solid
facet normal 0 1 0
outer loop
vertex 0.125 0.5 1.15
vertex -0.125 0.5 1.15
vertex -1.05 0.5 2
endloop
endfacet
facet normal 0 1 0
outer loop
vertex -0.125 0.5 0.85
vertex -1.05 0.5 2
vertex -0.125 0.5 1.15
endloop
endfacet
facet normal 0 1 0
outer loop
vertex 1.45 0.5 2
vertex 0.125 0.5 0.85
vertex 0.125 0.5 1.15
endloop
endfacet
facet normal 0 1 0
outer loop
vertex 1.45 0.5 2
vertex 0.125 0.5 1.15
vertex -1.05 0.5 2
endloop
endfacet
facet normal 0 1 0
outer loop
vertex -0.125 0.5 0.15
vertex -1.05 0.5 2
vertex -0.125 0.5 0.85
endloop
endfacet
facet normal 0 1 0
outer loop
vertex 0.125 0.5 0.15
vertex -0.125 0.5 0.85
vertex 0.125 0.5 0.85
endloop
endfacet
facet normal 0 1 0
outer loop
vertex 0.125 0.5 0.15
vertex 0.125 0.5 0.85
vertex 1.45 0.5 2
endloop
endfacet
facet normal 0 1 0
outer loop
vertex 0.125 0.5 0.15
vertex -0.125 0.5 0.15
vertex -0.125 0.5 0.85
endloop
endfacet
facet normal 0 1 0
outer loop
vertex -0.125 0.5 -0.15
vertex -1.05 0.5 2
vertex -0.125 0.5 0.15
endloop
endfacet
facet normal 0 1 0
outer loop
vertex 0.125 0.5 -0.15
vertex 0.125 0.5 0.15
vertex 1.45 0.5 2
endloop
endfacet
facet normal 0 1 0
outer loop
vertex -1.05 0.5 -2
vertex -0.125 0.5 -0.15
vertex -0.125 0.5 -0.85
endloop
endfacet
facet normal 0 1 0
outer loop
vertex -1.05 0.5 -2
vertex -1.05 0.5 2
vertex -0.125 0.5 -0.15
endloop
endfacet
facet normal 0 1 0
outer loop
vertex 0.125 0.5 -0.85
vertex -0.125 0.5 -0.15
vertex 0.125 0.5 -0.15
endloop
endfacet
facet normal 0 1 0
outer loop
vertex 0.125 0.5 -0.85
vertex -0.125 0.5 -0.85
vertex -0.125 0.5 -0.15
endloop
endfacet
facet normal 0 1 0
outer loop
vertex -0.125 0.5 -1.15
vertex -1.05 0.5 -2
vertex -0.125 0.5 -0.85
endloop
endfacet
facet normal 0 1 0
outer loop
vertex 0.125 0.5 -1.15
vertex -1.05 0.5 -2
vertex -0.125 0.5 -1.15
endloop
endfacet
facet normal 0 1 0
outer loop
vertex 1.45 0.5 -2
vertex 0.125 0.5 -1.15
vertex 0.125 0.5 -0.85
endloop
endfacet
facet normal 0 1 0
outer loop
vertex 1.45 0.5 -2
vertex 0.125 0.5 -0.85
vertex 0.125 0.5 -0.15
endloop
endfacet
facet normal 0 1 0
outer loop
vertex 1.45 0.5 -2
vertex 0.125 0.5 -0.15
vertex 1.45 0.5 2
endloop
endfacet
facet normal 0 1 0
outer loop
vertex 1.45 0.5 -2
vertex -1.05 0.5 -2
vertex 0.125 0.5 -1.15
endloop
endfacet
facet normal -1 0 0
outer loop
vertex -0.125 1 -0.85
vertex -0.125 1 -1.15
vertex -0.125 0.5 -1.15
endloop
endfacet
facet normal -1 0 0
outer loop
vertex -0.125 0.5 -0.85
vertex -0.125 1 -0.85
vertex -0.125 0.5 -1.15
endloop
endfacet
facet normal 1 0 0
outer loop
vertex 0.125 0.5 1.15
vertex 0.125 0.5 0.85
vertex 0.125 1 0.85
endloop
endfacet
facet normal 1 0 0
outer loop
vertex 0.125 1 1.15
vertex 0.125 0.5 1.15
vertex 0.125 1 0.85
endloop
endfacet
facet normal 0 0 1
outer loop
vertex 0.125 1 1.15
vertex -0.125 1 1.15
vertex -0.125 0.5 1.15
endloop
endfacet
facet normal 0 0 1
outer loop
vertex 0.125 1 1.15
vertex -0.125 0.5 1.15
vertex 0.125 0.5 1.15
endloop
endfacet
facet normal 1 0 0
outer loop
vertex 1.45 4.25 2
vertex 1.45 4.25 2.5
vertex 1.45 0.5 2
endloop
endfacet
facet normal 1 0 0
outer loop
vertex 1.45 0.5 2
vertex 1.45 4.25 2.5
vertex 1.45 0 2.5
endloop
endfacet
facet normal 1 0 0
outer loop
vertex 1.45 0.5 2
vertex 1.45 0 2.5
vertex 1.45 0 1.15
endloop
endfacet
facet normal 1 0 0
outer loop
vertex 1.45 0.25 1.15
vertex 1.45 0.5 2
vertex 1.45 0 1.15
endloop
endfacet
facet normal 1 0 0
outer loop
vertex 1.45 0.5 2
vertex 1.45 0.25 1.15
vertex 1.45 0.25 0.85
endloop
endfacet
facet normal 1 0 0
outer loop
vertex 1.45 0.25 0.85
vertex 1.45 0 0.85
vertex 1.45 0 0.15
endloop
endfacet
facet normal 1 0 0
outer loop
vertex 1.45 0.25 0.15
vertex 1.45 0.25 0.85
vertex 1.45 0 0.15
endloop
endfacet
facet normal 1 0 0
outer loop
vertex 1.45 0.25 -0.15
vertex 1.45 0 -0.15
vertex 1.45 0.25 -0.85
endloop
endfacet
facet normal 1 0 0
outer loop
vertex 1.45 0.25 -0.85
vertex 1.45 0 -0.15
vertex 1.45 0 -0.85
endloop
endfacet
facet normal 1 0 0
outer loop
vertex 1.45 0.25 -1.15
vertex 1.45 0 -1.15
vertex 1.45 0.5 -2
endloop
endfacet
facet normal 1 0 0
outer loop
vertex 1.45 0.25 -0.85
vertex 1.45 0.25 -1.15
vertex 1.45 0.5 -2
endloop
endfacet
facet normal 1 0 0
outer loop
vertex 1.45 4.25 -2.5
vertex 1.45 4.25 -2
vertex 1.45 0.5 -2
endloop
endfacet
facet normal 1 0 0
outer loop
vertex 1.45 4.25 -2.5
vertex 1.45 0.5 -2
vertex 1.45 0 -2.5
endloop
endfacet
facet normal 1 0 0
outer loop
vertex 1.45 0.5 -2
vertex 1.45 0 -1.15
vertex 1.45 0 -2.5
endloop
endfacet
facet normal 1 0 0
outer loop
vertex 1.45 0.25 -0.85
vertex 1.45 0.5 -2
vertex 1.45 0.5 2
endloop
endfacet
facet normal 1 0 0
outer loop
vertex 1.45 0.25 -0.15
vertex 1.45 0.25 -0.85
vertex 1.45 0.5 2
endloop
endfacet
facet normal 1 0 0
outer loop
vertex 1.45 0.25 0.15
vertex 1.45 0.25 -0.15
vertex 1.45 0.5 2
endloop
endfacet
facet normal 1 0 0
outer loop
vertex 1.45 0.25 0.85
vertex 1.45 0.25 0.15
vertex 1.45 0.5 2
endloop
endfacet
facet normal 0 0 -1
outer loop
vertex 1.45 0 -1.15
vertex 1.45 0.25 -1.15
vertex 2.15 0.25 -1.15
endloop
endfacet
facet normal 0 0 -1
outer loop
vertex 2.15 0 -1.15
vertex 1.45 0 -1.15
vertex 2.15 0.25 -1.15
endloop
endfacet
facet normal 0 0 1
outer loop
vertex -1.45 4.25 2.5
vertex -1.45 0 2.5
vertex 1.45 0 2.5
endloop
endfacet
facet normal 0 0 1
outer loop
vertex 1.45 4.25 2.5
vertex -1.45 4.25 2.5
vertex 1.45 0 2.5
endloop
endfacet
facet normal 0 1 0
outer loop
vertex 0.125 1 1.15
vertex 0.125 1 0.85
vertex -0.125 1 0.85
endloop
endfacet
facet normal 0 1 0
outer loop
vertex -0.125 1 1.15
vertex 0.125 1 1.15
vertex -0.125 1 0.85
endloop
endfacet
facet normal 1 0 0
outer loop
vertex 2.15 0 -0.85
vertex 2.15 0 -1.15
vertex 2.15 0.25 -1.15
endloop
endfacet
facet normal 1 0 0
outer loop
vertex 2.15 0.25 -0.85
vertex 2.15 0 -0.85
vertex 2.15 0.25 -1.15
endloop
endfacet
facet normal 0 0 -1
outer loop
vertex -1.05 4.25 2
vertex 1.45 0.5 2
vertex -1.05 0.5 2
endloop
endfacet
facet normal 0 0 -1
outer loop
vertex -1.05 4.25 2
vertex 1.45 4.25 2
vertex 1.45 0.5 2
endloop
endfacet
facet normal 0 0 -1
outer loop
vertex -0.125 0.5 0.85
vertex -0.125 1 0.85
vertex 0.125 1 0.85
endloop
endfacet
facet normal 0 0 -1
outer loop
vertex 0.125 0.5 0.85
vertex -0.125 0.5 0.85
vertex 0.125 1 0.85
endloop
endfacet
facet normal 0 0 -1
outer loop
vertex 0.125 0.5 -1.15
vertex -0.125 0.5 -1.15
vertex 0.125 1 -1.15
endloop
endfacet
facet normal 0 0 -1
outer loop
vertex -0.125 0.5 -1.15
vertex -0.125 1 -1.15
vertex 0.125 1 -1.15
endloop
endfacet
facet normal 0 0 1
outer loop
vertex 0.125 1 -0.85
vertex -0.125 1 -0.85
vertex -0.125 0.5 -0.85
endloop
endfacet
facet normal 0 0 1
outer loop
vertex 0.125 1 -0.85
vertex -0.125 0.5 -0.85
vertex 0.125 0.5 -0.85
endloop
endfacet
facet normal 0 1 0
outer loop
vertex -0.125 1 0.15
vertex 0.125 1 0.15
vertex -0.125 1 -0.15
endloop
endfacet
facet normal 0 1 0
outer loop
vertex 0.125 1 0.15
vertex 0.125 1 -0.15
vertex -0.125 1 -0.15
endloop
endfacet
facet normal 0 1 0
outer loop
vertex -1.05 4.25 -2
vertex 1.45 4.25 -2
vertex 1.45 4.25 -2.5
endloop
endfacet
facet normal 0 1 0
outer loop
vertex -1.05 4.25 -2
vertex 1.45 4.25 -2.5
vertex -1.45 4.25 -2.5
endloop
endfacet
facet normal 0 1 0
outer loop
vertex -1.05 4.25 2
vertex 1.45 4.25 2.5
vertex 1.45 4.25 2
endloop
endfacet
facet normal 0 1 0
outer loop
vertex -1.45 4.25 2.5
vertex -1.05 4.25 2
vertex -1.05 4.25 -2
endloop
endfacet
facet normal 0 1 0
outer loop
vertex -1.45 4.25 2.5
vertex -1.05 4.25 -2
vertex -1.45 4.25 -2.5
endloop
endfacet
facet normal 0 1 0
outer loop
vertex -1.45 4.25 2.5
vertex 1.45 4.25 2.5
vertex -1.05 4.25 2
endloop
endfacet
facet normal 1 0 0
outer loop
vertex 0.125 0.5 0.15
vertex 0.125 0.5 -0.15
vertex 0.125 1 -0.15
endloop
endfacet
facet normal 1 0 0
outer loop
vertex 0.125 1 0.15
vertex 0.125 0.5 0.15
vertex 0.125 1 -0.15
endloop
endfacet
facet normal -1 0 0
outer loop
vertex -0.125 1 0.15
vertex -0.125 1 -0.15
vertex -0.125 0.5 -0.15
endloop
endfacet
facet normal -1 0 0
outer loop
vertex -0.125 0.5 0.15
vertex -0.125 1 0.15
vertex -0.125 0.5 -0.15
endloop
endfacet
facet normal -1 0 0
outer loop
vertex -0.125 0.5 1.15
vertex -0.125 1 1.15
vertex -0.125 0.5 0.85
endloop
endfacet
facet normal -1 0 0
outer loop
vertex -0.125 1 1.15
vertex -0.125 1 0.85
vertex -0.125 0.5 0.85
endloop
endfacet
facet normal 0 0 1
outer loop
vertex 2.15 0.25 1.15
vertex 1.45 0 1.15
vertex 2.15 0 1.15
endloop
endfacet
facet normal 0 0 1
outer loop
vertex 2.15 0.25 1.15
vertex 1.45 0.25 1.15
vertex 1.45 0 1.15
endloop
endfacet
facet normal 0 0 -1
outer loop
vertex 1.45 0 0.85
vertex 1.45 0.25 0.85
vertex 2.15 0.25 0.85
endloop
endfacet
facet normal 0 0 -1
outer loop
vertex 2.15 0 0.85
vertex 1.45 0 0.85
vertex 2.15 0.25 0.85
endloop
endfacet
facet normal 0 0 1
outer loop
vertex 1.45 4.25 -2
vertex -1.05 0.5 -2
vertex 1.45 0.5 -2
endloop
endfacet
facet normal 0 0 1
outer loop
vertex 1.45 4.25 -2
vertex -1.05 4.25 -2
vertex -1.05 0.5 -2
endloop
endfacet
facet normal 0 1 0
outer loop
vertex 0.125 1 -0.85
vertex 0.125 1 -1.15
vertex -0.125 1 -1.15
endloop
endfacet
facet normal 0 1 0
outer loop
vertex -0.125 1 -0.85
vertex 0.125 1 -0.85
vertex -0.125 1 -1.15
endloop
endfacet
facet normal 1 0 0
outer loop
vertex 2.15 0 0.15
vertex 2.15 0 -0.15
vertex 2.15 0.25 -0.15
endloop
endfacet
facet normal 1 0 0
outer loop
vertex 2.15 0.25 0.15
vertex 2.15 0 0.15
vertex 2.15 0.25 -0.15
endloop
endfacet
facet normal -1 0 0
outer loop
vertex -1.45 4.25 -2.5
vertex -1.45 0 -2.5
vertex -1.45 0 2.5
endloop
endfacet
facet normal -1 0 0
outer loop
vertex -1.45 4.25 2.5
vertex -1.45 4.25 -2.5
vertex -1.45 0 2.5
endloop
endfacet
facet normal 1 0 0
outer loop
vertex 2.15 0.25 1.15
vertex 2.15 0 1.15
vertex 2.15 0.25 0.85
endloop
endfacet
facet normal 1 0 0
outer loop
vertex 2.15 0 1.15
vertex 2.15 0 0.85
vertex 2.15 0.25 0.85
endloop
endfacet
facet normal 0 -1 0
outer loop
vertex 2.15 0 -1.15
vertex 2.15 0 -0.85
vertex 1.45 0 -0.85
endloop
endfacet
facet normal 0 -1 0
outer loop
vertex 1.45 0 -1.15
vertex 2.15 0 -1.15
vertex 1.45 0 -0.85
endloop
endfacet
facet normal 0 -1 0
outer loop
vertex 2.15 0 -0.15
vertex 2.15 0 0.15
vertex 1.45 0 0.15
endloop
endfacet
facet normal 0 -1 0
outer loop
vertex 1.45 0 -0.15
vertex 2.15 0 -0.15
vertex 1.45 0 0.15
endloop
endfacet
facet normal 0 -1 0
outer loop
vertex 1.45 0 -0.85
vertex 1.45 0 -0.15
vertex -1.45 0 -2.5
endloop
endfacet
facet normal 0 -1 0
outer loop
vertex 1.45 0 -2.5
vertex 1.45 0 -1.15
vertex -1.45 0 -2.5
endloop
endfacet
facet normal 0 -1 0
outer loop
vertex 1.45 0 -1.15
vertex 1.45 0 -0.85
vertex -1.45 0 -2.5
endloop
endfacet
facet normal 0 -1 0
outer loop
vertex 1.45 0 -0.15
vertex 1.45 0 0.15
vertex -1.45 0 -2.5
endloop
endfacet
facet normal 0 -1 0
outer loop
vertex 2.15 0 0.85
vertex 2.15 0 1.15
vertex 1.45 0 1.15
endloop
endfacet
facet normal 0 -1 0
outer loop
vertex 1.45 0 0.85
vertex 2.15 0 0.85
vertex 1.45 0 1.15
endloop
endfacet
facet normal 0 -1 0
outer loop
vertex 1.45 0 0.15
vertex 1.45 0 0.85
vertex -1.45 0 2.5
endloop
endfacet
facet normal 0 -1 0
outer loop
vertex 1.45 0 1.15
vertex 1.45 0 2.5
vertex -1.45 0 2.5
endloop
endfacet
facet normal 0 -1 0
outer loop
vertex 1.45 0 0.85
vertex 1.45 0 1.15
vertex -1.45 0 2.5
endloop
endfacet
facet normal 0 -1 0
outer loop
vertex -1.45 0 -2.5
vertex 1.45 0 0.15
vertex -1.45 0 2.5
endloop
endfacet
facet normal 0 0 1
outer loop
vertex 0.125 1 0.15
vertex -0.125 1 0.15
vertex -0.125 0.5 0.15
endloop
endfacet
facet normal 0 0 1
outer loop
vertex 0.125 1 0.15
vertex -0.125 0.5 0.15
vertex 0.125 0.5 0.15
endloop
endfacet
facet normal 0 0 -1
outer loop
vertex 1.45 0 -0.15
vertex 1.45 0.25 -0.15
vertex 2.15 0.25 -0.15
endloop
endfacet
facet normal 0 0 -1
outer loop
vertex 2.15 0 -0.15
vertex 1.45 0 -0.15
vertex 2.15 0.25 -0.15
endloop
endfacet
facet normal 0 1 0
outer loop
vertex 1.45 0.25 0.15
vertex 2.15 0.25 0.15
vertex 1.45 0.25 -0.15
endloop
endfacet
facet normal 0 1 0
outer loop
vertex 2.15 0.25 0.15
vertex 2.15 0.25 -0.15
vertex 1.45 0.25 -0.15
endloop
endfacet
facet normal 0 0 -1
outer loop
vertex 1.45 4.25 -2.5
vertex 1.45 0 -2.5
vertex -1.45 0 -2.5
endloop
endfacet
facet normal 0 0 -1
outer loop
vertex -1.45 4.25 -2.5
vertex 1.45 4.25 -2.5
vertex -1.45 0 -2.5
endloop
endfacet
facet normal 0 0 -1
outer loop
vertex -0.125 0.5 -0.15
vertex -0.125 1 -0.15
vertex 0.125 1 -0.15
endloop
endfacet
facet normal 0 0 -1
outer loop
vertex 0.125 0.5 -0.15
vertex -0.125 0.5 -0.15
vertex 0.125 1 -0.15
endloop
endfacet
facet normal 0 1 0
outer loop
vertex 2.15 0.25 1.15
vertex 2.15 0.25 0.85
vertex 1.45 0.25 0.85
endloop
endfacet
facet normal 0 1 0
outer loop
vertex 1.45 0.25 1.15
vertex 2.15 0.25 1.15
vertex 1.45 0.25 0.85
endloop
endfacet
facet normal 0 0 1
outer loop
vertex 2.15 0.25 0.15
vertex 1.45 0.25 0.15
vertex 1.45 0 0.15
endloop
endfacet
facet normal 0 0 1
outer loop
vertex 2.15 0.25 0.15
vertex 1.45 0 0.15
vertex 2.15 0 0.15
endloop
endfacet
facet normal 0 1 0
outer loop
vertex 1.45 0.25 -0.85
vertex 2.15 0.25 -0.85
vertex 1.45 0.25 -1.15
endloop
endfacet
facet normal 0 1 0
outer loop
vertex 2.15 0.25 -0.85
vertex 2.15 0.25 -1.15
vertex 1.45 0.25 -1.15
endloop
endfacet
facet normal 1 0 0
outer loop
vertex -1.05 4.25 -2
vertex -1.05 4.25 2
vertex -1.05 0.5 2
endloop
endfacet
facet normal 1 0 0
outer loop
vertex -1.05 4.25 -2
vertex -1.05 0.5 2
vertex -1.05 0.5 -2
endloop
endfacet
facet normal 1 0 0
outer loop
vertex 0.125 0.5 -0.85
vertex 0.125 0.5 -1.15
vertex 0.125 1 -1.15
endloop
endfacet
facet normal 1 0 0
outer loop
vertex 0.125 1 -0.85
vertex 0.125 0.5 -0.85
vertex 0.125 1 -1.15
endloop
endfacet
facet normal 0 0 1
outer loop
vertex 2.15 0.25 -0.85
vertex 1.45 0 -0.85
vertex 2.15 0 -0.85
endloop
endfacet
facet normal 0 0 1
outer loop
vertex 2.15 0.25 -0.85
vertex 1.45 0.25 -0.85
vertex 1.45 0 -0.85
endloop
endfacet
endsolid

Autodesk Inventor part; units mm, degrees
ref_plane "YZ Plane" through (0, 0, 0) normal (1, 0, 0) x (0, 1, 0)
ref_plane "XZ Plane" through (0, 0, 0) normal (0, 1, 0) x (-1, 0, 0)
ref_plane "XY Plane" through (0, 0, 0) normal (0, 0, 1) x (1, 0, 0)
sketch "Sketch1" plane through (0, 0, 0) normal (0, 1, 0) x (-1, 0, 0)
  line L0 (1.45, 2.5) -> (-1.45, 2.5)
  line L1 (-1.45, 2.5) -> (-1.45, -2.5)
  line L2 (-1.45, -2.5) -> (1.45, -2.5)
  line L3 (1.45, -2.5) -> (1.45, 2.5)
  point P0 (0, 0)
  dimension "d0" = 2.9
  dimension "d1" = 1.45
  dimension "d2" = 5
  dimension "d3" = 2.5
extrude "Extrusion1" add sketch "Sketch1" along normal blind 4.25
sketch "Sketch2" plane through (0, 4.25, 0) normal (0, 1, 0) x (1, 0, 0)
  line L0 (1.45, -2.5) -> (1.45, 2.5) projected
  line L1 (1.45, -2) -> (-1.05, -2)
  line L2 (-1.05, -2) -> (-1.05, 2)
  line L3 (-1.05, 2) -> (1.45, 2)
  line L4 (1.45, 2) -> (1.45, -2)
  point P0 (0, 0)
  dimension "d6" = 4
  dimension "d7" = 2
  dimension "d8" = 2.5
extrude "Extrusion2" cut sketch "Sketch2" against normal blind 3.75
sketch "Sketch3" plane through (0, 0, 0) normal (0, 0, 1) x (1, 0, 0)
  line L0 (0.125, 1) -> (-0.125, 1)
  line L1 (-0.125, 1) -> (-0.125, 0)
  line L2 (-0.125, 0) -> (2.15, 0)
  line L3 (2.15, 0) -> (2.15, 0.25)
  line L4 (2.15, 0.25) -> (0.125, 0.25)
  line L5 (0.125, 0.25) -> (0.125, 1)
  point P0 (0, 0)
  dimension "d11" = 2.15
  dimension "d12" = 0
  dimension "d13" = 0.25
  dimension "d14" = 0.25
  dimension "d15" = 0.125
  dimension "d16" = 1
extrude "Extrusion3" add sketch "Sketch3" along normal mid plane 0.3
pattern_linear "Rectangular Pattern1" count 3 spacing 1 along (0, 0, 1) of "Extrusion3" first direction both ways yes
properties part number "RZ_3Pos_1mm_SM_Header"
